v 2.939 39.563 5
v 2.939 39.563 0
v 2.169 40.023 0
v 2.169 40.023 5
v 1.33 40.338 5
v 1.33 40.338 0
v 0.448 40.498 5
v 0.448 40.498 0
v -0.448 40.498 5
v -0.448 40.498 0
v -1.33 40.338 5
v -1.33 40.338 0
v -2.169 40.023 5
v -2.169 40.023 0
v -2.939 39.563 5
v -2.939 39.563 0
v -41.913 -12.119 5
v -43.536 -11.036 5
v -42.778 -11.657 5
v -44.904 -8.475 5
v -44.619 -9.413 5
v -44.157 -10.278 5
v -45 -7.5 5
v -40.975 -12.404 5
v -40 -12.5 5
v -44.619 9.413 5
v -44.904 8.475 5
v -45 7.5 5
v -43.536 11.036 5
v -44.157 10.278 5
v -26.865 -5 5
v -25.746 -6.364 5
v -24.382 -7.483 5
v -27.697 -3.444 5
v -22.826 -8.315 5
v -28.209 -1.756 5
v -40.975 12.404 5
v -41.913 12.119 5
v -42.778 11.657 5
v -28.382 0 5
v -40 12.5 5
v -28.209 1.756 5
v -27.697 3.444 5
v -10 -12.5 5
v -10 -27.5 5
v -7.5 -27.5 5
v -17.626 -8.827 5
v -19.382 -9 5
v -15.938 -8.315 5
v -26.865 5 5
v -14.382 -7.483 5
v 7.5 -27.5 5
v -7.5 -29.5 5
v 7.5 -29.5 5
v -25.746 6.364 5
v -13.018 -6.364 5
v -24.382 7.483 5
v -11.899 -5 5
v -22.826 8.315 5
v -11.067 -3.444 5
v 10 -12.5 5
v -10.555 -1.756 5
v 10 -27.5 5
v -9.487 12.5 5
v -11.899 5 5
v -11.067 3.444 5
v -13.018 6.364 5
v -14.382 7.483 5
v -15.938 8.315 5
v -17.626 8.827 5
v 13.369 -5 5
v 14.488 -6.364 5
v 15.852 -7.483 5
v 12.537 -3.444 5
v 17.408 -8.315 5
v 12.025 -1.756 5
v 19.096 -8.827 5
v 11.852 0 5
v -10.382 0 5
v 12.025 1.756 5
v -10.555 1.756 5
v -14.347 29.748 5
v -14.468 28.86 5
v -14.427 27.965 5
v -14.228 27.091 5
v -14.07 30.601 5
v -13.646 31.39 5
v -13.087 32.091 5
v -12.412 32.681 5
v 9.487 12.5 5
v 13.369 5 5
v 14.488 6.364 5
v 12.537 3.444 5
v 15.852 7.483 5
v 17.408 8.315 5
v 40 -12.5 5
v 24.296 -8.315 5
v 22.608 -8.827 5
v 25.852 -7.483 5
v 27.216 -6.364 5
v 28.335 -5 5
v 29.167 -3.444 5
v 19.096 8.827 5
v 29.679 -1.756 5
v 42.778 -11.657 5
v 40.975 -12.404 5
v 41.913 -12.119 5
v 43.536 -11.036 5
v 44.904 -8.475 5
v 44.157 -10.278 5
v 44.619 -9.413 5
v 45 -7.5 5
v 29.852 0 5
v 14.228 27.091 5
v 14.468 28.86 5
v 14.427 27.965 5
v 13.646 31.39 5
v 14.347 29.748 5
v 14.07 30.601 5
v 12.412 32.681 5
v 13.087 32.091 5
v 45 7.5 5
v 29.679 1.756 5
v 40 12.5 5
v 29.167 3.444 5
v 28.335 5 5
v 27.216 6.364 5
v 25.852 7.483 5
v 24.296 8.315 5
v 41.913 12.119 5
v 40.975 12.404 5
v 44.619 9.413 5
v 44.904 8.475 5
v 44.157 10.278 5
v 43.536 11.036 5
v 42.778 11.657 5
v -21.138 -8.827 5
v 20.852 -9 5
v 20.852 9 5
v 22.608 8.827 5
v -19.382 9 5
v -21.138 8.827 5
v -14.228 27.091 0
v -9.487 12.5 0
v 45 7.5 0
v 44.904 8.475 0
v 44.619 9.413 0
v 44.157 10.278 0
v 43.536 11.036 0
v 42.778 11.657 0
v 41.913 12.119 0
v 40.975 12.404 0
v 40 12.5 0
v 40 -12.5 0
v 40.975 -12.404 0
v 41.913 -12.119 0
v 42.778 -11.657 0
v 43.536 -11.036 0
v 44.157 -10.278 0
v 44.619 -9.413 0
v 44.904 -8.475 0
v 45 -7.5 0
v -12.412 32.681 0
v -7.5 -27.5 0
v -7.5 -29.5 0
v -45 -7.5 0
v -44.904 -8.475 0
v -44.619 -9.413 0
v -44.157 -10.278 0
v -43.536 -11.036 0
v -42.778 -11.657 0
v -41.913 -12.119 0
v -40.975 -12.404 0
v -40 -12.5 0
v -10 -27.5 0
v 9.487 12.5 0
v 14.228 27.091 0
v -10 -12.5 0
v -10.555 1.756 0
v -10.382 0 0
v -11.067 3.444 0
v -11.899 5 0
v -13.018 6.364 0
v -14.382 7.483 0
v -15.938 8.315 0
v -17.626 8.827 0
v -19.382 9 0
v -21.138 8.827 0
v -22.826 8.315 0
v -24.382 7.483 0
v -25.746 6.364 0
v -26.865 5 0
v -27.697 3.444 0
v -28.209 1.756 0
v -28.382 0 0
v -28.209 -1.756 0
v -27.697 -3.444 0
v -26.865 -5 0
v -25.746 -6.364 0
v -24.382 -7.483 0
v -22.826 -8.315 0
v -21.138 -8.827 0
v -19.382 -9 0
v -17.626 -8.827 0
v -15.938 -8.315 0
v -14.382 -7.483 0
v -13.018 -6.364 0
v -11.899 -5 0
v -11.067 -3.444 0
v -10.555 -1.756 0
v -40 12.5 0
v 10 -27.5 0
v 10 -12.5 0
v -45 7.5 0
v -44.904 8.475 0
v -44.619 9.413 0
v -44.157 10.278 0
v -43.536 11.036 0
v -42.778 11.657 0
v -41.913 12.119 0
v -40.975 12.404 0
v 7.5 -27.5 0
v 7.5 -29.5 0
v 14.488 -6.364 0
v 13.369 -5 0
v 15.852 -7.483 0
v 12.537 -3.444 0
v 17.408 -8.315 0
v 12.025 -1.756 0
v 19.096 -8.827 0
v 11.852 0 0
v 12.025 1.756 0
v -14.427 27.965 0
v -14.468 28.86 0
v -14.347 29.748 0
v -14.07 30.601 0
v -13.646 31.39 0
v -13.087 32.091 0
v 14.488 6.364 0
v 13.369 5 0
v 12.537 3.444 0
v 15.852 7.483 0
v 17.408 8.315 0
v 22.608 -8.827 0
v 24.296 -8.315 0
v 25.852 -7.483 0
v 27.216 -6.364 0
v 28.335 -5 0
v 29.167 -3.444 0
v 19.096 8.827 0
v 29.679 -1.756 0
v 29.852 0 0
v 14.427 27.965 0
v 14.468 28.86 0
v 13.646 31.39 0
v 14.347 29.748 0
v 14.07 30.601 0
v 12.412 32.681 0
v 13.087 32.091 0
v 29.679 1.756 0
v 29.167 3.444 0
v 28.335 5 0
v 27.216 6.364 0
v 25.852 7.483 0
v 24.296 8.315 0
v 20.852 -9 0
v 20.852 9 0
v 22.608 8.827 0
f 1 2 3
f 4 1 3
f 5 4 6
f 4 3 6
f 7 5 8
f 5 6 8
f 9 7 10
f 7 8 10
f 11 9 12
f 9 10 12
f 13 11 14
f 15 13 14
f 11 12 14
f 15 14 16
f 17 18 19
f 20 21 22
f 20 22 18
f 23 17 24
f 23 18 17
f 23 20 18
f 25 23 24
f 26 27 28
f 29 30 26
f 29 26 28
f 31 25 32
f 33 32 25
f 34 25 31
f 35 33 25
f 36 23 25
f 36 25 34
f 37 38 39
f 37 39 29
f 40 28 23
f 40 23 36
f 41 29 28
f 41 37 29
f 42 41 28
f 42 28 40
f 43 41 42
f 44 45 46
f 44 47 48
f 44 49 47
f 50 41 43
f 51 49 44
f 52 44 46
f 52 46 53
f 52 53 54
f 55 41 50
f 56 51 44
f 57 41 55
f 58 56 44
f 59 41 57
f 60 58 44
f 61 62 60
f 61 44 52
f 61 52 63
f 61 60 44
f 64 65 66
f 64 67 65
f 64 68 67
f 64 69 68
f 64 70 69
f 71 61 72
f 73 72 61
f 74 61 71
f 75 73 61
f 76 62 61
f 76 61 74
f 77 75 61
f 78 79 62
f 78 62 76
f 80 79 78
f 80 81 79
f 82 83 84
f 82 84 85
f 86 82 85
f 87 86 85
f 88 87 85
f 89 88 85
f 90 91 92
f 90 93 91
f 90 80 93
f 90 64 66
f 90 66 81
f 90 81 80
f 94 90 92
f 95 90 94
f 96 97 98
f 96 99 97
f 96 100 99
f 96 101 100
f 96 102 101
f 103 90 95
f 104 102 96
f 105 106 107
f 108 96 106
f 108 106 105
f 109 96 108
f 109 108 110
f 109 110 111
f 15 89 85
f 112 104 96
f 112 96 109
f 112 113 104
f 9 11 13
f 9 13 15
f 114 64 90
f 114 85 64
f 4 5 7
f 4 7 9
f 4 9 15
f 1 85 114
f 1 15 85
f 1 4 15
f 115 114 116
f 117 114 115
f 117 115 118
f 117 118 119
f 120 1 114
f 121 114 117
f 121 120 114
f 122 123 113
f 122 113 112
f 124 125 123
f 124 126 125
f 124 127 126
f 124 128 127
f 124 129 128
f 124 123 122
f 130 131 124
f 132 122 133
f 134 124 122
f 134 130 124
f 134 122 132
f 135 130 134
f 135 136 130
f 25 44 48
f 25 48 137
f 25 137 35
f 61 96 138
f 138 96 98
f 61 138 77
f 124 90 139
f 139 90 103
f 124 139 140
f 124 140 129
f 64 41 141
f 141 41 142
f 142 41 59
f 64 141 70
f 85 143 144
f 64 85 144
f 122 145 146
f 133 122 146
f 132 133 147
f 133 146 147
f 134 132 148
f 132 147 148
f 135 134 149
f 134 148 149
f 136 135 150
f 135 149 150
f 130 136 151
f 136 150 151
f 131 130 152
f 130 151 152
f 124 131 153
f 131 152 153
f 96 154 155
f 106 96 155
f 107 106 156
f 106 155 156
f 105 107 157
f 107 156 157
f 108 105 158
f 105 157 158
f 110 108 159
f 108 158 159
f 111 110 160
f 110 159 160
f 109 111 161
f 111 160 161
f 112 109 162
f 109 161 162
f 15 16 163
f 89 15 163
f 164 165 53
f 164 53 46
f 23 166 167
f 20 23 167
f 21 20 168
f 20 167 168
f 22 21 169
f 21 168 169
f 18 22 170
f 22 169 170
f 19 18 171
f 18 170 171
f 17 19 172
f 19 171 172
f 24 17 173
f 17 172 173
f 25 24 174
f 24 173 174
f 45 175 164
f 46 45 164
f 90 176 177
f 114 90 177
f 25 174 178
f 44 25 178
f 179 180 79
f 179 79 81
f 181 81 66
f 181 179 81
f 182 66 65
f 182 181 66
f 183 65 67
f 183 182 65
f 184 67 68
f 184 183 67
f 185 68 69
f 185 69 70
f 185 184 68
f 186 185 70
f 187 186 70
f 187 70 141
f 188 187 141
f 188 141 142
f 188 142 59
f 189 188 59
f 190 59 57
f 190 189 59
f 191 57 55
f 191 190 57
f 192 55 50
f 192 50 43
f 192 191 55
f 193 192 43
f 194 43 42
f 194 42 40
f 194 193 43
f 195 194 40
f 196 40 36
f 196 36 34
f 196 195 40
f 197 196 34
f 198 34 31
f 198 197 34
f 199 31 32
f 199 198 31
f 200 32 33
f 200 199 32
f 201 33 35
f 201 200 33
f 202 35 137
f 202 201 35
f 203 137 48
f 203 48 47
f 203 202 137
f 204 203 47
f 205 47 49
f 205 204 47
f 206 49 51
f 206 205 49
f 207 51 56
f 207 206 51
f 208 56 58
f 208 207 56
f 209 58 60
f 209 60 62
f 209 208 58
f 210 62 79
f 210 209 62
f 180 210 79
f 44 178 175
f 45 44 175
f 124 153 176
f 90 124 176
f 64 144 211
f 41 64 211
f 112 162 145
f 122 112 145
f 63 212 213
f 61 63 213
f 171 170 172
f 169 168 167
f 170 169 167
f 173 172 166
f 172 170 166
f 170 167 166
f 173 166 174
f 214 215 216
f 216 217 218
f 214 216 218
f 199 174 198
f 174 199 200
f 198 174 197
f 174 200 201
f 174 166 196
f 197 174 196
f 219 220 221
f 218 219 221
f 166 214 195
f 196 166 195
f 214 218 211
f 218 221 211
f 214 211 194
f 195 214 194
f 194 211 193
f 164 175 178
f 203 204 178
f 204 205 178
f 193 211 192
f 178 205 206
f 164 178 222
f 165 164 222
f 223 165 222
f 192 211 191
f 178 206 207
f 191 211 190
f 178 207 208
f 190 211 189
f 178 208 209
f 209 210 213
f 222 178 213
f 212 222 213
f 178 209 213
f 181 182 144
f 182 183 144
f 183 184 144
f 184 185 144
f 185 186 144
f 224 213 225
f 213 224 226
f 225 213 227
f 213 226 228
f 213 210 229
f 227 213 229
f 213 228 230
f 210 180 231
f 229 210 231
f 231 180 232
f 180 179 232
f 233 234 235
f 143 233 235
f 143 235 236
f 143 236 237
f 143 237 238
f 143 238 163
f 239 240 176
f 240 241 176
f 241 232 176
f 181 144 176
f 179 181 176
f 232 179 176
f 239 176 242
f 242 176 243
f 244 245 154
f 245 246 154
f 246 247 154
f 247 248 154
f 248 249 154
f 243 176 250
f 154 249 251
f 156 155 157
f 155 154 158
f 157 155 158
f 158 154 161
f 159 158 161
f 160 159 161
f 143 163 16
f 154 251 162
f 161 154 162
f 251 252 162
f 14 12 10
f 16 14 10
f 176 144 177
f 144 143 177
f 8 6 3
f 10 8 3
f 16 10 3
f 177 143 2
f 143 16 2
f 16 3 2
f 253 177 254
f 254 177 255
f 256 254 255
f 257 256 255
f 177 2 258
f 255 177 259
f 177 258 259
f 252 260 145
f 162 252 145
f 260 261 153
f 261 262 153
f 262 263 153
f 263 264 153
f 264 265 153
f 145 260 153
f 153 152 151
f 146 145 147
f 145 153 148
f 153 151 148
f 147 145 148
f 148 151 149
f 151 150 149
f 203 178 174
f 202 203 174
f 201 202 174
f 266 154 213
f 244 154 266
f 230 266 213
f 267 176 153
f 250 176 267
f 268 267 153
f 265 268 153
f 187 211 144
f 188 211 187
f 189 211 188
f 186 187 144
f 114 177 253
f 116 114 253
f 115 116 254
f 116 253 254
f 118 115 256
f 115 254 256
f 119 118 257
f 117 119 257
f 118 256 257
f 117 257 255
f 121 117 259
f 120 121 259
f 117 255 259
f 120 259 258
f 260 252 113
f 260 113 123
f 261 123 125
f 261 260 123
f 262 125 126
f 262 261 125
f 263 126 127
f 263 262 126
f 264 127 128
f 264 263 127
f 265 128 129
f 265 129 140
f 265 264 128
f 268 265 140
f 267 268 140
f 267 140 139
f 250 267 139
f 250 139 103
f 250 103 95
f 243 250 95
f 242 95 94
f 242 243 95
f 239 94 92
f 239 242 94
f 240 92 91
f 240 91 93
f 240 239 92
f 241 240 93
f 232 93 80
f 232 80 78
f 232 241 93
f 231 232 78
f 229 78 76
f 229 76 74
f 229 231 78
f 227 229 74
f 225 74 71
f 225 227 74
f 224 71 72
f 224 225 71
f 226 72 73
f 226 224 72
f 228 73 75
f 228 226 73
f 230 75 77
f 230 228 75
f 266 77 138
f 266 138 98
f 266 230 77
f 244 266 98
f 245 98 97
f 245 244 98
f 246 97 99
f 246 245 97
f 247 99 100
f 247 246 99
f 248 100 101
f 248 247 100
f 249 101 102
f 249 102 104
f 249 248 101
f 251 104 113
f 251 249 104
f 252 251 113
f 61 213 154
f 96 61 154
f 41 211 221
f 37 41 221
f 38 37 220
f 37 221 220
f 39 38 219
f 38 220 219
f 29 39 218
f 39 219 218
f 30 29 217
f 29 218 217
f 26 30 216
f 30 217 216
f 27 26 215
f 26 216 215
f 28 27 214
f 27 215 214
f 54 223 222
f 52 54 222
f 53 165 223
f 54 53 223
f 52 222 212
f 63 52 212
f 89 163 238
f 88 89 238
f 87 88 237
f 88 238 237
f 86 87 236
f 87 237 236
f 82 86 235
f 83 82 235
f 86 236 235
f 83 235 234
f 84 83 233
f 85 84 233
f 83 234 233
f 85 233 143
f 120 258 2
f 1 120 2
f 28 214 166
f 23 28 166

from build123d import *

# Parameters (mm, degrees)
F0_R     = 9
F0_W     = 15
F0_H     = 2
F1_DEPTH = 5


with BuildPart() as f1:
    # F0 (on Top) → F1 (new body)
    with BuildSketch(Plane.XY):
        with BuildLine():
            Line((-9.487151, 12.5), (-40, 12.5))
            ThreePointArc((-40, 12.5), (-43.535534, 11.035534), (-45, 7.5))
            Line((-45, 7.5), (-45, -7.5))
            ThreePointArc((-45, -7.5), (-43.535534, -11.035534), (-40, -12.5))
            Line((-40, -12.5), (-10, -12.5))
            Line((-10, -12.5), (10, -12.5))
            Line((10, -12.5), (40, -12.5))
            ThreePointArc((40, -12.5), (43.535534, -11.035534), (45, -7.5))
            Line((45, -7.5), (45, 7.5))
            ThreePointArc((45, 7.5), (43.535534, 11.035534), (40, 12.5))
            Line((40, 12.5), (9.487151, 12.5))
            Line((9.487151, 12.5), (-9.487151, 12.5))
        make_face()
        with Locations((-19.38206, 0)):
            Circle(F0_R, mode=Mode.SUBTRACT)
        with Locations((20.852027, 0)):
            Circle(F0_R, mode=Mode.SUBTRACT)
        with BuildLine():
            Line((-14.227962, 27.090718), (-9.487151, 12.5))
            Line((-9.487151, 12.5), (9.487151, 12.5))
            Line((9.487151, 12.5), (14.227962, 27.090718))
            ThreePointArc((14.227962, 27.090718), (14.227962, 30.180888), (12.411606, 32.680888))
            Line((12.411606, 32.680888), (2.938926, 39.563193))
            ThreePointArc((2.938926, 39.563193), (0, 40.518108), (-2.938926, 39.563193))
            Line((-2.938926, 39.563193), (-12.411606, 32.680888))
            ThreePointArc((-12.411606, 32.680888), (-14.227962, 30.180888), (-14.227962, 27.090718))
        make_face()
        Polygon((10, -12.5), (-10, -12.5), (-10, -27.5), (-7.5, -27.5), (7.5, -27.5), (10, -27.5), align=None)
        with Locations((0, -28.5)):
            Rectangle(F0_W, F0_H)
    extrude(amount=F1_DEPTH)


solid = f1.part
